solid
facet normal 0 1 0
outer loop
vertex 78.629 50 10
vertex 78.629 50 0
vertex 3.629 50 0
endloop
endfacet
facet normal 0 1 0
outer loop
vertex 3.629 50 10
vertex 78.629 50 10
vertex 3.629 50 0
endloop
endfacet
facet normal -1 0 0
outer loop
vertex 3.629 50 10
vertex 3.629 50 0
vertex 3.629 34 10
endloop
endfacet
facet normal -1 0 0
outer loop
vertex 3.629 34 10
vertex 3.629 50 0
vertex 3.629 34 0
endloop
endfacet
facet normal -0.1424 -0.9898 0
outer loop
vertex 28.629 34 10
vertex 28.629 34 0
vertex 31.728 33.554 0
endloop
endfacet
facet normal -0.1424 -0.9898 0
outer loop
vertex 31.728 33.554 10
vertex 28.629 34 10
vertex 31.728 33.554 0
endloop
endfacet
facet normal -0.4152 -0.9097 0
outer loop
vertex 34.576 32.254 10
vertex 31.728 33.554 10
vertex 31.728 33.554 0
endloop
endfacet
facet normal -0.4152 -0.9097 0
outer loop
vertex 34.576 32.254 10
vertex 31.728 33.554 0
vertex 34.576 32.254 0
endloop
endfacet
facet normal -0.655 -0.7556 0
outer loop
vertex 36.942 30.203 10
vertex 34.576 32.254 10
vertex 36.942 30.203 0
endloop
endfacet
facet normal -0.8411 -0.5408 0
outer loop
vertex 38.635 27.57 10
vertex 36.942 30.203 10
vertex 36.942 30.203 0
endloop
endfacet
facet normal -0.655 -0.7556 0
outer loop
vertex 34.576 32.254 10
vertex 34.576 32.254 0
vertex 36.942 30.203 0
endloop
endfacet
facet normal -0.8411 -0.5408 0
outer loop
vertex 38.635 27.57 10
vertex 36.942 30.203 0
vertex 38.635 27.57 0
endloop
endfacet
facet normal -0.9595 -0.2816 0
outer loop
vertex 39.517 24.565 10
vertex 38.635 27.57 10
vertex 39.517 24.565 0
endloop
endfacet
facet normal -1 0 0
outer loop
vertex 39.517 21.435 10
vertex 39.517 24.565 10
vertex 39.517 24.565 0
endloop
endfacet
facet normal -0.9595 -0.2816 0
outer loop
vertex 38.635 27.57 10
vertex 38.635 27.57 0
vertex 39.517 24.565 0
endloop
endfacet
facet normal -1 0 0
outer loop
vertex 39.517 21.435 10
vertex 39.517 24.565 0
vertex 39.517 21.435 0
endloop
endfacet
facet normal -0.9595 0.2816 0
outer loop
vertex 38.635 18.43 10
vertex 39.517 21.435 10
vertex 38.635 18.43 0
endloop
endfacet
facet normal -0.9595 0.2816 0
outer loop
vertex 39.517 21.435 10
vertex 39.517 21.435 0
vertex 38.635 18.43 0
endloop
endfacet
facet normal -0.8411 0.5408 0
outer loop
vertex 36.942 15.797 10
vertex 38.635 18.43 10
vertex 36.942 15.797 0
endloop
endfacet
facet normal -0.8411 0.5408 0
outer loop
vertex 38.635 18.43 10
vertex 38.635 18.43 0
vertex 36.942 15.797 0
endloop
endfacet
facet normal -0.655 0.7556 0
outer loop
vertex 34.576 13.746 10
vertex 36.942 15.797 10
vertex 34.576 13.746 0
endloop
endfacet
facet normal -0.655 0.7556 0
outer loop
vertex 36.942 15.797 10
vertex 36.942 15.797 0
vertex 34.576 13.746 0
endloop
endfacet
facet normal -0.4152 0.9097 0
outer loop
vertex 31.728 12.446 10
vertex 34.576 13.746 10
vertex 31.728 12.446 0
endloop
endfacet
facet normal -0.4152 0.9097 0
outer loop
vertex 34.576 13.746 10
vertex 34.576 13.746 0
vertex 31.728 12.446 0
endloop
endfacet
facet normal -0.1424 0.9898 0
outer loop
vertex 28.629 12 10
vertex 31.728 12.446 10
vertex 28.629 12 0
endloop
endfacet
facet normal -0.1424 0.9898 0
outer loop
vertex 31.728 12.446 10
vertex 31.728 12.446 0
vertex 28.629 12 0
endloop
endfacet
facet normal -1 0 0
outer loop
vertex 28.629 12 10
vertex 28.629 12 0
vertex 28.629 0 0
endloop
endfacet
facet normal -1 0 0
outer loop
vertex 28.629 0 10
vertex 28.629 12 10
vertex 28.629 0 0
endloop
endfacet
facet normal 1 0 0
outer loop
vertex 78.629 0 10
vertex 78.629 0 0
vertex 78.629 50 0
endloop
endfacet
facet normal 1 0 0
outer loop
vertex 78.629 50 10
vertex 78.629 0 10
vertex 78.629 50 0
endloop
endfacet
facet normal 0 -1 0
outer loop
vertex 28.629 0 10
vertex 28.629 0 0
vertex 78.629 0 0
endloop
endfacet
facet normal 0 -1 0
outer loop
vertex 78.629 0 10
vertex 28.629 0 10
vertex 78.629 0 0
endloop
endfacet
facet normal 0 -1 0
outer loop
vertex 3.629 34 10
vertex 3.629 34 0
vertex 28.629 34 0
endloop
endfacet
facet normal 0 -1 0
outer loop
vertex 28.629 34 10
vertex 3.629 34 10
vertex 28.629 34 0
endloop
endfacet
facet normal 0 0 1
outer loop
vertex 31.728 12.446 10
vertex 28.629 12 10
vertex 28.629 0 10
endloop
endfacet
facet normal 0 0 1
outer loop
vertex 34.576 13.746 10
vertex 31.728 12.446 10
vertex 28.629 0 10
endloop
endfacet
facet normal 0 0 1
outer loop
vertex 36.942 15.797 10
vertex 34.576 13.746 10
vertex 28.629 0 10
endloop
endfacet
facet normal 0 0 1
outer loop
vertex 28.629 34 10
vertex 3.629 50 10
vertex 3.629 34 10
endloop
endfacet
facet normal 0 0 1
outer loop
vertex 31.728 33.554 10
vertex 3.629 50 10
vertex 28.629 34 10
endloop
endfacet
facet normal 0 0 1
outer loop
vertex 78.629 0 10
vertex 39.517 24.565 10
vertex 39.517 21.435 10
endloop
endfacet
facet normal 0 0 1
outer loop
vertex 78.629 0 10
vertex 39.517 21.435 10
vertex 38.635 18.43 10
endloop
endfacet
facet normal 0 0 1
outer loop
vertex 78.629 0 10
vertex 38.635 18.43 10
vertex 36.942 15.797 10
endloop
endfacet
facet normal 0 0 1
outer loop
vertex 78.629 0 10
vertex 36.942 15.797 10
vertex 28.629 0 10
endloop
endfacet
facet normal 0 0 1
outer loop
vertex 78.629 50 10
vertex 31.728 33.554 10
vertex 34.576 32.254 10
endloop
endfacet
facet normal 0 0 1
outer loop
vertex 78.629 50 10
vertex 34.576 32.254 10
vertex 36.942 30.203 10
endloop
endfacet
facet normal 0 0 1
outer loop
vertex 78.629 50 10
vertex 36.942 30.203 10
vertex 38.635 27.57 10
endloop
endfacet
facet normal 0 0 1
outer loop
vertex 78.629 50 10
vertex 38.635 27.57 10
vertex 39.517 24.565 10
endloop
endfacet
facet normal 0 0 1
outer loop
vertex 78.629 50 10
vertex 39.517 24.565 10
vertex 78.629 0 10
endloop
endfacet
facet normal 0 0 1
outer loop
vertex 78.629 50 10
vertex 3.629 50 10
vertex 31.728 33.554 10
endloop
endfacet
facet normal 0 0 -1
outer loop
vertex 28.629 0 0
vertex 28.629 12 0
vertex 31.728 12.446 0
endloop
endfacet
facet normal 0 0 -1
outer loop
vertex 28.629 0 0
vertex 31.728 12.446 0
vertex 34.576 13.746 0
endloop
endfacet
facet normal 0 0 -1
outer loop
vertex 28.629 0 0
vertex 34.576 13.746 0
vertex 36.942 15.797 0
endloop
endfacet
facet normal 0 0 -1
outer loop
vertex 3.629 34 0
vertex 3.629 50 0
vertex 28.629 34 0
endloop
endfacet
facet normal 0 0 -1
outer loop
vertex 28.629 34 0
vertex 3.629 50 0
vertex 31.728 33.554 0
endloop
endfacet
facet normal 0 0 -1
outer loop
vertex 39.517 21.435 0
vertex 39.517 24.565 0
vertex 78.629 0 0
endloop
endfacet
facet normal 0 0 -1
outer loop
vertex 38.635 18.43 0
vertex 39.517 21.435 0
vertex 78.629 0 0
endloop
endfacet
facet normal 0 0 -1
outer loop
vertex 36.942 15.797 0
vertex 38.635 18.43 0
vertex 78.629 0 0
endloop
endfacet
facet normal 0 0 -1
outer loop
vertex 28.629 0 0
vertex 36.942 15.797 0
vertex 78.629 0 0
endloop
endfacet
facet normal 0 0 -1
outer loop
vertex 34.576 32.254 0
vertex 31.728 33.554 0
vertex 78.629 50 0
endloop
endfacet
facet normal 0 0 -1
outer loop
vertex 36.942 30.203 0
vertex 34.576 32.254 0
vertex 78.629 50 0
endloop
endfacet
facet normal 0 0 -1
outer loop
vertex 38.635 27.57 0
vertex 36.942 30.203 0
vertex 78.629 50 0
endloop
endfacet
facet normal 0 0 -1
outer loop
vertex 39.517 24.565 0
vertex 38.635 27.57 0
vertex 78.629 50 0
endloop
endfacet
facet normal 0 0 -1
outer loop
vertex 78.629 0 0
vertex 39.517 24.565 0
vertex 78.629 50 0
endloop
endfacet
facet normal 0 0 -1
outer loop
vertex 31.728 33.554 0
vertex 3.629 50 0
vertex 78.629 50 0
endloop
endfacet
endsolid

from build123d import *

# Parameters (mm, degrees)
F1_DEPTH = 10


with BuildPart() as f1:
    # F0 (on Top) → F1 (new body)
    with BuildSketch(Plane.XY):
        with BuildLine():
            Line((28.628895, 12), (28.628895, 0))
            Line((28.628895, 0), (78.628895, 0))
            Line((78.628895, 0), (78.628895, 50))
            Line((78.628895, 50), (3.628895, 50))
            Line((3.628895, 50), (3.628895, 34))
            Line((3.628895, 34), (28.628895, 34))
            ThreePointArc((28.628895, 34), (39.628895, 23), (28.628895, 12))
        make_face()
    extrude(amount=F1_DEPTH)


solid = f1.part
